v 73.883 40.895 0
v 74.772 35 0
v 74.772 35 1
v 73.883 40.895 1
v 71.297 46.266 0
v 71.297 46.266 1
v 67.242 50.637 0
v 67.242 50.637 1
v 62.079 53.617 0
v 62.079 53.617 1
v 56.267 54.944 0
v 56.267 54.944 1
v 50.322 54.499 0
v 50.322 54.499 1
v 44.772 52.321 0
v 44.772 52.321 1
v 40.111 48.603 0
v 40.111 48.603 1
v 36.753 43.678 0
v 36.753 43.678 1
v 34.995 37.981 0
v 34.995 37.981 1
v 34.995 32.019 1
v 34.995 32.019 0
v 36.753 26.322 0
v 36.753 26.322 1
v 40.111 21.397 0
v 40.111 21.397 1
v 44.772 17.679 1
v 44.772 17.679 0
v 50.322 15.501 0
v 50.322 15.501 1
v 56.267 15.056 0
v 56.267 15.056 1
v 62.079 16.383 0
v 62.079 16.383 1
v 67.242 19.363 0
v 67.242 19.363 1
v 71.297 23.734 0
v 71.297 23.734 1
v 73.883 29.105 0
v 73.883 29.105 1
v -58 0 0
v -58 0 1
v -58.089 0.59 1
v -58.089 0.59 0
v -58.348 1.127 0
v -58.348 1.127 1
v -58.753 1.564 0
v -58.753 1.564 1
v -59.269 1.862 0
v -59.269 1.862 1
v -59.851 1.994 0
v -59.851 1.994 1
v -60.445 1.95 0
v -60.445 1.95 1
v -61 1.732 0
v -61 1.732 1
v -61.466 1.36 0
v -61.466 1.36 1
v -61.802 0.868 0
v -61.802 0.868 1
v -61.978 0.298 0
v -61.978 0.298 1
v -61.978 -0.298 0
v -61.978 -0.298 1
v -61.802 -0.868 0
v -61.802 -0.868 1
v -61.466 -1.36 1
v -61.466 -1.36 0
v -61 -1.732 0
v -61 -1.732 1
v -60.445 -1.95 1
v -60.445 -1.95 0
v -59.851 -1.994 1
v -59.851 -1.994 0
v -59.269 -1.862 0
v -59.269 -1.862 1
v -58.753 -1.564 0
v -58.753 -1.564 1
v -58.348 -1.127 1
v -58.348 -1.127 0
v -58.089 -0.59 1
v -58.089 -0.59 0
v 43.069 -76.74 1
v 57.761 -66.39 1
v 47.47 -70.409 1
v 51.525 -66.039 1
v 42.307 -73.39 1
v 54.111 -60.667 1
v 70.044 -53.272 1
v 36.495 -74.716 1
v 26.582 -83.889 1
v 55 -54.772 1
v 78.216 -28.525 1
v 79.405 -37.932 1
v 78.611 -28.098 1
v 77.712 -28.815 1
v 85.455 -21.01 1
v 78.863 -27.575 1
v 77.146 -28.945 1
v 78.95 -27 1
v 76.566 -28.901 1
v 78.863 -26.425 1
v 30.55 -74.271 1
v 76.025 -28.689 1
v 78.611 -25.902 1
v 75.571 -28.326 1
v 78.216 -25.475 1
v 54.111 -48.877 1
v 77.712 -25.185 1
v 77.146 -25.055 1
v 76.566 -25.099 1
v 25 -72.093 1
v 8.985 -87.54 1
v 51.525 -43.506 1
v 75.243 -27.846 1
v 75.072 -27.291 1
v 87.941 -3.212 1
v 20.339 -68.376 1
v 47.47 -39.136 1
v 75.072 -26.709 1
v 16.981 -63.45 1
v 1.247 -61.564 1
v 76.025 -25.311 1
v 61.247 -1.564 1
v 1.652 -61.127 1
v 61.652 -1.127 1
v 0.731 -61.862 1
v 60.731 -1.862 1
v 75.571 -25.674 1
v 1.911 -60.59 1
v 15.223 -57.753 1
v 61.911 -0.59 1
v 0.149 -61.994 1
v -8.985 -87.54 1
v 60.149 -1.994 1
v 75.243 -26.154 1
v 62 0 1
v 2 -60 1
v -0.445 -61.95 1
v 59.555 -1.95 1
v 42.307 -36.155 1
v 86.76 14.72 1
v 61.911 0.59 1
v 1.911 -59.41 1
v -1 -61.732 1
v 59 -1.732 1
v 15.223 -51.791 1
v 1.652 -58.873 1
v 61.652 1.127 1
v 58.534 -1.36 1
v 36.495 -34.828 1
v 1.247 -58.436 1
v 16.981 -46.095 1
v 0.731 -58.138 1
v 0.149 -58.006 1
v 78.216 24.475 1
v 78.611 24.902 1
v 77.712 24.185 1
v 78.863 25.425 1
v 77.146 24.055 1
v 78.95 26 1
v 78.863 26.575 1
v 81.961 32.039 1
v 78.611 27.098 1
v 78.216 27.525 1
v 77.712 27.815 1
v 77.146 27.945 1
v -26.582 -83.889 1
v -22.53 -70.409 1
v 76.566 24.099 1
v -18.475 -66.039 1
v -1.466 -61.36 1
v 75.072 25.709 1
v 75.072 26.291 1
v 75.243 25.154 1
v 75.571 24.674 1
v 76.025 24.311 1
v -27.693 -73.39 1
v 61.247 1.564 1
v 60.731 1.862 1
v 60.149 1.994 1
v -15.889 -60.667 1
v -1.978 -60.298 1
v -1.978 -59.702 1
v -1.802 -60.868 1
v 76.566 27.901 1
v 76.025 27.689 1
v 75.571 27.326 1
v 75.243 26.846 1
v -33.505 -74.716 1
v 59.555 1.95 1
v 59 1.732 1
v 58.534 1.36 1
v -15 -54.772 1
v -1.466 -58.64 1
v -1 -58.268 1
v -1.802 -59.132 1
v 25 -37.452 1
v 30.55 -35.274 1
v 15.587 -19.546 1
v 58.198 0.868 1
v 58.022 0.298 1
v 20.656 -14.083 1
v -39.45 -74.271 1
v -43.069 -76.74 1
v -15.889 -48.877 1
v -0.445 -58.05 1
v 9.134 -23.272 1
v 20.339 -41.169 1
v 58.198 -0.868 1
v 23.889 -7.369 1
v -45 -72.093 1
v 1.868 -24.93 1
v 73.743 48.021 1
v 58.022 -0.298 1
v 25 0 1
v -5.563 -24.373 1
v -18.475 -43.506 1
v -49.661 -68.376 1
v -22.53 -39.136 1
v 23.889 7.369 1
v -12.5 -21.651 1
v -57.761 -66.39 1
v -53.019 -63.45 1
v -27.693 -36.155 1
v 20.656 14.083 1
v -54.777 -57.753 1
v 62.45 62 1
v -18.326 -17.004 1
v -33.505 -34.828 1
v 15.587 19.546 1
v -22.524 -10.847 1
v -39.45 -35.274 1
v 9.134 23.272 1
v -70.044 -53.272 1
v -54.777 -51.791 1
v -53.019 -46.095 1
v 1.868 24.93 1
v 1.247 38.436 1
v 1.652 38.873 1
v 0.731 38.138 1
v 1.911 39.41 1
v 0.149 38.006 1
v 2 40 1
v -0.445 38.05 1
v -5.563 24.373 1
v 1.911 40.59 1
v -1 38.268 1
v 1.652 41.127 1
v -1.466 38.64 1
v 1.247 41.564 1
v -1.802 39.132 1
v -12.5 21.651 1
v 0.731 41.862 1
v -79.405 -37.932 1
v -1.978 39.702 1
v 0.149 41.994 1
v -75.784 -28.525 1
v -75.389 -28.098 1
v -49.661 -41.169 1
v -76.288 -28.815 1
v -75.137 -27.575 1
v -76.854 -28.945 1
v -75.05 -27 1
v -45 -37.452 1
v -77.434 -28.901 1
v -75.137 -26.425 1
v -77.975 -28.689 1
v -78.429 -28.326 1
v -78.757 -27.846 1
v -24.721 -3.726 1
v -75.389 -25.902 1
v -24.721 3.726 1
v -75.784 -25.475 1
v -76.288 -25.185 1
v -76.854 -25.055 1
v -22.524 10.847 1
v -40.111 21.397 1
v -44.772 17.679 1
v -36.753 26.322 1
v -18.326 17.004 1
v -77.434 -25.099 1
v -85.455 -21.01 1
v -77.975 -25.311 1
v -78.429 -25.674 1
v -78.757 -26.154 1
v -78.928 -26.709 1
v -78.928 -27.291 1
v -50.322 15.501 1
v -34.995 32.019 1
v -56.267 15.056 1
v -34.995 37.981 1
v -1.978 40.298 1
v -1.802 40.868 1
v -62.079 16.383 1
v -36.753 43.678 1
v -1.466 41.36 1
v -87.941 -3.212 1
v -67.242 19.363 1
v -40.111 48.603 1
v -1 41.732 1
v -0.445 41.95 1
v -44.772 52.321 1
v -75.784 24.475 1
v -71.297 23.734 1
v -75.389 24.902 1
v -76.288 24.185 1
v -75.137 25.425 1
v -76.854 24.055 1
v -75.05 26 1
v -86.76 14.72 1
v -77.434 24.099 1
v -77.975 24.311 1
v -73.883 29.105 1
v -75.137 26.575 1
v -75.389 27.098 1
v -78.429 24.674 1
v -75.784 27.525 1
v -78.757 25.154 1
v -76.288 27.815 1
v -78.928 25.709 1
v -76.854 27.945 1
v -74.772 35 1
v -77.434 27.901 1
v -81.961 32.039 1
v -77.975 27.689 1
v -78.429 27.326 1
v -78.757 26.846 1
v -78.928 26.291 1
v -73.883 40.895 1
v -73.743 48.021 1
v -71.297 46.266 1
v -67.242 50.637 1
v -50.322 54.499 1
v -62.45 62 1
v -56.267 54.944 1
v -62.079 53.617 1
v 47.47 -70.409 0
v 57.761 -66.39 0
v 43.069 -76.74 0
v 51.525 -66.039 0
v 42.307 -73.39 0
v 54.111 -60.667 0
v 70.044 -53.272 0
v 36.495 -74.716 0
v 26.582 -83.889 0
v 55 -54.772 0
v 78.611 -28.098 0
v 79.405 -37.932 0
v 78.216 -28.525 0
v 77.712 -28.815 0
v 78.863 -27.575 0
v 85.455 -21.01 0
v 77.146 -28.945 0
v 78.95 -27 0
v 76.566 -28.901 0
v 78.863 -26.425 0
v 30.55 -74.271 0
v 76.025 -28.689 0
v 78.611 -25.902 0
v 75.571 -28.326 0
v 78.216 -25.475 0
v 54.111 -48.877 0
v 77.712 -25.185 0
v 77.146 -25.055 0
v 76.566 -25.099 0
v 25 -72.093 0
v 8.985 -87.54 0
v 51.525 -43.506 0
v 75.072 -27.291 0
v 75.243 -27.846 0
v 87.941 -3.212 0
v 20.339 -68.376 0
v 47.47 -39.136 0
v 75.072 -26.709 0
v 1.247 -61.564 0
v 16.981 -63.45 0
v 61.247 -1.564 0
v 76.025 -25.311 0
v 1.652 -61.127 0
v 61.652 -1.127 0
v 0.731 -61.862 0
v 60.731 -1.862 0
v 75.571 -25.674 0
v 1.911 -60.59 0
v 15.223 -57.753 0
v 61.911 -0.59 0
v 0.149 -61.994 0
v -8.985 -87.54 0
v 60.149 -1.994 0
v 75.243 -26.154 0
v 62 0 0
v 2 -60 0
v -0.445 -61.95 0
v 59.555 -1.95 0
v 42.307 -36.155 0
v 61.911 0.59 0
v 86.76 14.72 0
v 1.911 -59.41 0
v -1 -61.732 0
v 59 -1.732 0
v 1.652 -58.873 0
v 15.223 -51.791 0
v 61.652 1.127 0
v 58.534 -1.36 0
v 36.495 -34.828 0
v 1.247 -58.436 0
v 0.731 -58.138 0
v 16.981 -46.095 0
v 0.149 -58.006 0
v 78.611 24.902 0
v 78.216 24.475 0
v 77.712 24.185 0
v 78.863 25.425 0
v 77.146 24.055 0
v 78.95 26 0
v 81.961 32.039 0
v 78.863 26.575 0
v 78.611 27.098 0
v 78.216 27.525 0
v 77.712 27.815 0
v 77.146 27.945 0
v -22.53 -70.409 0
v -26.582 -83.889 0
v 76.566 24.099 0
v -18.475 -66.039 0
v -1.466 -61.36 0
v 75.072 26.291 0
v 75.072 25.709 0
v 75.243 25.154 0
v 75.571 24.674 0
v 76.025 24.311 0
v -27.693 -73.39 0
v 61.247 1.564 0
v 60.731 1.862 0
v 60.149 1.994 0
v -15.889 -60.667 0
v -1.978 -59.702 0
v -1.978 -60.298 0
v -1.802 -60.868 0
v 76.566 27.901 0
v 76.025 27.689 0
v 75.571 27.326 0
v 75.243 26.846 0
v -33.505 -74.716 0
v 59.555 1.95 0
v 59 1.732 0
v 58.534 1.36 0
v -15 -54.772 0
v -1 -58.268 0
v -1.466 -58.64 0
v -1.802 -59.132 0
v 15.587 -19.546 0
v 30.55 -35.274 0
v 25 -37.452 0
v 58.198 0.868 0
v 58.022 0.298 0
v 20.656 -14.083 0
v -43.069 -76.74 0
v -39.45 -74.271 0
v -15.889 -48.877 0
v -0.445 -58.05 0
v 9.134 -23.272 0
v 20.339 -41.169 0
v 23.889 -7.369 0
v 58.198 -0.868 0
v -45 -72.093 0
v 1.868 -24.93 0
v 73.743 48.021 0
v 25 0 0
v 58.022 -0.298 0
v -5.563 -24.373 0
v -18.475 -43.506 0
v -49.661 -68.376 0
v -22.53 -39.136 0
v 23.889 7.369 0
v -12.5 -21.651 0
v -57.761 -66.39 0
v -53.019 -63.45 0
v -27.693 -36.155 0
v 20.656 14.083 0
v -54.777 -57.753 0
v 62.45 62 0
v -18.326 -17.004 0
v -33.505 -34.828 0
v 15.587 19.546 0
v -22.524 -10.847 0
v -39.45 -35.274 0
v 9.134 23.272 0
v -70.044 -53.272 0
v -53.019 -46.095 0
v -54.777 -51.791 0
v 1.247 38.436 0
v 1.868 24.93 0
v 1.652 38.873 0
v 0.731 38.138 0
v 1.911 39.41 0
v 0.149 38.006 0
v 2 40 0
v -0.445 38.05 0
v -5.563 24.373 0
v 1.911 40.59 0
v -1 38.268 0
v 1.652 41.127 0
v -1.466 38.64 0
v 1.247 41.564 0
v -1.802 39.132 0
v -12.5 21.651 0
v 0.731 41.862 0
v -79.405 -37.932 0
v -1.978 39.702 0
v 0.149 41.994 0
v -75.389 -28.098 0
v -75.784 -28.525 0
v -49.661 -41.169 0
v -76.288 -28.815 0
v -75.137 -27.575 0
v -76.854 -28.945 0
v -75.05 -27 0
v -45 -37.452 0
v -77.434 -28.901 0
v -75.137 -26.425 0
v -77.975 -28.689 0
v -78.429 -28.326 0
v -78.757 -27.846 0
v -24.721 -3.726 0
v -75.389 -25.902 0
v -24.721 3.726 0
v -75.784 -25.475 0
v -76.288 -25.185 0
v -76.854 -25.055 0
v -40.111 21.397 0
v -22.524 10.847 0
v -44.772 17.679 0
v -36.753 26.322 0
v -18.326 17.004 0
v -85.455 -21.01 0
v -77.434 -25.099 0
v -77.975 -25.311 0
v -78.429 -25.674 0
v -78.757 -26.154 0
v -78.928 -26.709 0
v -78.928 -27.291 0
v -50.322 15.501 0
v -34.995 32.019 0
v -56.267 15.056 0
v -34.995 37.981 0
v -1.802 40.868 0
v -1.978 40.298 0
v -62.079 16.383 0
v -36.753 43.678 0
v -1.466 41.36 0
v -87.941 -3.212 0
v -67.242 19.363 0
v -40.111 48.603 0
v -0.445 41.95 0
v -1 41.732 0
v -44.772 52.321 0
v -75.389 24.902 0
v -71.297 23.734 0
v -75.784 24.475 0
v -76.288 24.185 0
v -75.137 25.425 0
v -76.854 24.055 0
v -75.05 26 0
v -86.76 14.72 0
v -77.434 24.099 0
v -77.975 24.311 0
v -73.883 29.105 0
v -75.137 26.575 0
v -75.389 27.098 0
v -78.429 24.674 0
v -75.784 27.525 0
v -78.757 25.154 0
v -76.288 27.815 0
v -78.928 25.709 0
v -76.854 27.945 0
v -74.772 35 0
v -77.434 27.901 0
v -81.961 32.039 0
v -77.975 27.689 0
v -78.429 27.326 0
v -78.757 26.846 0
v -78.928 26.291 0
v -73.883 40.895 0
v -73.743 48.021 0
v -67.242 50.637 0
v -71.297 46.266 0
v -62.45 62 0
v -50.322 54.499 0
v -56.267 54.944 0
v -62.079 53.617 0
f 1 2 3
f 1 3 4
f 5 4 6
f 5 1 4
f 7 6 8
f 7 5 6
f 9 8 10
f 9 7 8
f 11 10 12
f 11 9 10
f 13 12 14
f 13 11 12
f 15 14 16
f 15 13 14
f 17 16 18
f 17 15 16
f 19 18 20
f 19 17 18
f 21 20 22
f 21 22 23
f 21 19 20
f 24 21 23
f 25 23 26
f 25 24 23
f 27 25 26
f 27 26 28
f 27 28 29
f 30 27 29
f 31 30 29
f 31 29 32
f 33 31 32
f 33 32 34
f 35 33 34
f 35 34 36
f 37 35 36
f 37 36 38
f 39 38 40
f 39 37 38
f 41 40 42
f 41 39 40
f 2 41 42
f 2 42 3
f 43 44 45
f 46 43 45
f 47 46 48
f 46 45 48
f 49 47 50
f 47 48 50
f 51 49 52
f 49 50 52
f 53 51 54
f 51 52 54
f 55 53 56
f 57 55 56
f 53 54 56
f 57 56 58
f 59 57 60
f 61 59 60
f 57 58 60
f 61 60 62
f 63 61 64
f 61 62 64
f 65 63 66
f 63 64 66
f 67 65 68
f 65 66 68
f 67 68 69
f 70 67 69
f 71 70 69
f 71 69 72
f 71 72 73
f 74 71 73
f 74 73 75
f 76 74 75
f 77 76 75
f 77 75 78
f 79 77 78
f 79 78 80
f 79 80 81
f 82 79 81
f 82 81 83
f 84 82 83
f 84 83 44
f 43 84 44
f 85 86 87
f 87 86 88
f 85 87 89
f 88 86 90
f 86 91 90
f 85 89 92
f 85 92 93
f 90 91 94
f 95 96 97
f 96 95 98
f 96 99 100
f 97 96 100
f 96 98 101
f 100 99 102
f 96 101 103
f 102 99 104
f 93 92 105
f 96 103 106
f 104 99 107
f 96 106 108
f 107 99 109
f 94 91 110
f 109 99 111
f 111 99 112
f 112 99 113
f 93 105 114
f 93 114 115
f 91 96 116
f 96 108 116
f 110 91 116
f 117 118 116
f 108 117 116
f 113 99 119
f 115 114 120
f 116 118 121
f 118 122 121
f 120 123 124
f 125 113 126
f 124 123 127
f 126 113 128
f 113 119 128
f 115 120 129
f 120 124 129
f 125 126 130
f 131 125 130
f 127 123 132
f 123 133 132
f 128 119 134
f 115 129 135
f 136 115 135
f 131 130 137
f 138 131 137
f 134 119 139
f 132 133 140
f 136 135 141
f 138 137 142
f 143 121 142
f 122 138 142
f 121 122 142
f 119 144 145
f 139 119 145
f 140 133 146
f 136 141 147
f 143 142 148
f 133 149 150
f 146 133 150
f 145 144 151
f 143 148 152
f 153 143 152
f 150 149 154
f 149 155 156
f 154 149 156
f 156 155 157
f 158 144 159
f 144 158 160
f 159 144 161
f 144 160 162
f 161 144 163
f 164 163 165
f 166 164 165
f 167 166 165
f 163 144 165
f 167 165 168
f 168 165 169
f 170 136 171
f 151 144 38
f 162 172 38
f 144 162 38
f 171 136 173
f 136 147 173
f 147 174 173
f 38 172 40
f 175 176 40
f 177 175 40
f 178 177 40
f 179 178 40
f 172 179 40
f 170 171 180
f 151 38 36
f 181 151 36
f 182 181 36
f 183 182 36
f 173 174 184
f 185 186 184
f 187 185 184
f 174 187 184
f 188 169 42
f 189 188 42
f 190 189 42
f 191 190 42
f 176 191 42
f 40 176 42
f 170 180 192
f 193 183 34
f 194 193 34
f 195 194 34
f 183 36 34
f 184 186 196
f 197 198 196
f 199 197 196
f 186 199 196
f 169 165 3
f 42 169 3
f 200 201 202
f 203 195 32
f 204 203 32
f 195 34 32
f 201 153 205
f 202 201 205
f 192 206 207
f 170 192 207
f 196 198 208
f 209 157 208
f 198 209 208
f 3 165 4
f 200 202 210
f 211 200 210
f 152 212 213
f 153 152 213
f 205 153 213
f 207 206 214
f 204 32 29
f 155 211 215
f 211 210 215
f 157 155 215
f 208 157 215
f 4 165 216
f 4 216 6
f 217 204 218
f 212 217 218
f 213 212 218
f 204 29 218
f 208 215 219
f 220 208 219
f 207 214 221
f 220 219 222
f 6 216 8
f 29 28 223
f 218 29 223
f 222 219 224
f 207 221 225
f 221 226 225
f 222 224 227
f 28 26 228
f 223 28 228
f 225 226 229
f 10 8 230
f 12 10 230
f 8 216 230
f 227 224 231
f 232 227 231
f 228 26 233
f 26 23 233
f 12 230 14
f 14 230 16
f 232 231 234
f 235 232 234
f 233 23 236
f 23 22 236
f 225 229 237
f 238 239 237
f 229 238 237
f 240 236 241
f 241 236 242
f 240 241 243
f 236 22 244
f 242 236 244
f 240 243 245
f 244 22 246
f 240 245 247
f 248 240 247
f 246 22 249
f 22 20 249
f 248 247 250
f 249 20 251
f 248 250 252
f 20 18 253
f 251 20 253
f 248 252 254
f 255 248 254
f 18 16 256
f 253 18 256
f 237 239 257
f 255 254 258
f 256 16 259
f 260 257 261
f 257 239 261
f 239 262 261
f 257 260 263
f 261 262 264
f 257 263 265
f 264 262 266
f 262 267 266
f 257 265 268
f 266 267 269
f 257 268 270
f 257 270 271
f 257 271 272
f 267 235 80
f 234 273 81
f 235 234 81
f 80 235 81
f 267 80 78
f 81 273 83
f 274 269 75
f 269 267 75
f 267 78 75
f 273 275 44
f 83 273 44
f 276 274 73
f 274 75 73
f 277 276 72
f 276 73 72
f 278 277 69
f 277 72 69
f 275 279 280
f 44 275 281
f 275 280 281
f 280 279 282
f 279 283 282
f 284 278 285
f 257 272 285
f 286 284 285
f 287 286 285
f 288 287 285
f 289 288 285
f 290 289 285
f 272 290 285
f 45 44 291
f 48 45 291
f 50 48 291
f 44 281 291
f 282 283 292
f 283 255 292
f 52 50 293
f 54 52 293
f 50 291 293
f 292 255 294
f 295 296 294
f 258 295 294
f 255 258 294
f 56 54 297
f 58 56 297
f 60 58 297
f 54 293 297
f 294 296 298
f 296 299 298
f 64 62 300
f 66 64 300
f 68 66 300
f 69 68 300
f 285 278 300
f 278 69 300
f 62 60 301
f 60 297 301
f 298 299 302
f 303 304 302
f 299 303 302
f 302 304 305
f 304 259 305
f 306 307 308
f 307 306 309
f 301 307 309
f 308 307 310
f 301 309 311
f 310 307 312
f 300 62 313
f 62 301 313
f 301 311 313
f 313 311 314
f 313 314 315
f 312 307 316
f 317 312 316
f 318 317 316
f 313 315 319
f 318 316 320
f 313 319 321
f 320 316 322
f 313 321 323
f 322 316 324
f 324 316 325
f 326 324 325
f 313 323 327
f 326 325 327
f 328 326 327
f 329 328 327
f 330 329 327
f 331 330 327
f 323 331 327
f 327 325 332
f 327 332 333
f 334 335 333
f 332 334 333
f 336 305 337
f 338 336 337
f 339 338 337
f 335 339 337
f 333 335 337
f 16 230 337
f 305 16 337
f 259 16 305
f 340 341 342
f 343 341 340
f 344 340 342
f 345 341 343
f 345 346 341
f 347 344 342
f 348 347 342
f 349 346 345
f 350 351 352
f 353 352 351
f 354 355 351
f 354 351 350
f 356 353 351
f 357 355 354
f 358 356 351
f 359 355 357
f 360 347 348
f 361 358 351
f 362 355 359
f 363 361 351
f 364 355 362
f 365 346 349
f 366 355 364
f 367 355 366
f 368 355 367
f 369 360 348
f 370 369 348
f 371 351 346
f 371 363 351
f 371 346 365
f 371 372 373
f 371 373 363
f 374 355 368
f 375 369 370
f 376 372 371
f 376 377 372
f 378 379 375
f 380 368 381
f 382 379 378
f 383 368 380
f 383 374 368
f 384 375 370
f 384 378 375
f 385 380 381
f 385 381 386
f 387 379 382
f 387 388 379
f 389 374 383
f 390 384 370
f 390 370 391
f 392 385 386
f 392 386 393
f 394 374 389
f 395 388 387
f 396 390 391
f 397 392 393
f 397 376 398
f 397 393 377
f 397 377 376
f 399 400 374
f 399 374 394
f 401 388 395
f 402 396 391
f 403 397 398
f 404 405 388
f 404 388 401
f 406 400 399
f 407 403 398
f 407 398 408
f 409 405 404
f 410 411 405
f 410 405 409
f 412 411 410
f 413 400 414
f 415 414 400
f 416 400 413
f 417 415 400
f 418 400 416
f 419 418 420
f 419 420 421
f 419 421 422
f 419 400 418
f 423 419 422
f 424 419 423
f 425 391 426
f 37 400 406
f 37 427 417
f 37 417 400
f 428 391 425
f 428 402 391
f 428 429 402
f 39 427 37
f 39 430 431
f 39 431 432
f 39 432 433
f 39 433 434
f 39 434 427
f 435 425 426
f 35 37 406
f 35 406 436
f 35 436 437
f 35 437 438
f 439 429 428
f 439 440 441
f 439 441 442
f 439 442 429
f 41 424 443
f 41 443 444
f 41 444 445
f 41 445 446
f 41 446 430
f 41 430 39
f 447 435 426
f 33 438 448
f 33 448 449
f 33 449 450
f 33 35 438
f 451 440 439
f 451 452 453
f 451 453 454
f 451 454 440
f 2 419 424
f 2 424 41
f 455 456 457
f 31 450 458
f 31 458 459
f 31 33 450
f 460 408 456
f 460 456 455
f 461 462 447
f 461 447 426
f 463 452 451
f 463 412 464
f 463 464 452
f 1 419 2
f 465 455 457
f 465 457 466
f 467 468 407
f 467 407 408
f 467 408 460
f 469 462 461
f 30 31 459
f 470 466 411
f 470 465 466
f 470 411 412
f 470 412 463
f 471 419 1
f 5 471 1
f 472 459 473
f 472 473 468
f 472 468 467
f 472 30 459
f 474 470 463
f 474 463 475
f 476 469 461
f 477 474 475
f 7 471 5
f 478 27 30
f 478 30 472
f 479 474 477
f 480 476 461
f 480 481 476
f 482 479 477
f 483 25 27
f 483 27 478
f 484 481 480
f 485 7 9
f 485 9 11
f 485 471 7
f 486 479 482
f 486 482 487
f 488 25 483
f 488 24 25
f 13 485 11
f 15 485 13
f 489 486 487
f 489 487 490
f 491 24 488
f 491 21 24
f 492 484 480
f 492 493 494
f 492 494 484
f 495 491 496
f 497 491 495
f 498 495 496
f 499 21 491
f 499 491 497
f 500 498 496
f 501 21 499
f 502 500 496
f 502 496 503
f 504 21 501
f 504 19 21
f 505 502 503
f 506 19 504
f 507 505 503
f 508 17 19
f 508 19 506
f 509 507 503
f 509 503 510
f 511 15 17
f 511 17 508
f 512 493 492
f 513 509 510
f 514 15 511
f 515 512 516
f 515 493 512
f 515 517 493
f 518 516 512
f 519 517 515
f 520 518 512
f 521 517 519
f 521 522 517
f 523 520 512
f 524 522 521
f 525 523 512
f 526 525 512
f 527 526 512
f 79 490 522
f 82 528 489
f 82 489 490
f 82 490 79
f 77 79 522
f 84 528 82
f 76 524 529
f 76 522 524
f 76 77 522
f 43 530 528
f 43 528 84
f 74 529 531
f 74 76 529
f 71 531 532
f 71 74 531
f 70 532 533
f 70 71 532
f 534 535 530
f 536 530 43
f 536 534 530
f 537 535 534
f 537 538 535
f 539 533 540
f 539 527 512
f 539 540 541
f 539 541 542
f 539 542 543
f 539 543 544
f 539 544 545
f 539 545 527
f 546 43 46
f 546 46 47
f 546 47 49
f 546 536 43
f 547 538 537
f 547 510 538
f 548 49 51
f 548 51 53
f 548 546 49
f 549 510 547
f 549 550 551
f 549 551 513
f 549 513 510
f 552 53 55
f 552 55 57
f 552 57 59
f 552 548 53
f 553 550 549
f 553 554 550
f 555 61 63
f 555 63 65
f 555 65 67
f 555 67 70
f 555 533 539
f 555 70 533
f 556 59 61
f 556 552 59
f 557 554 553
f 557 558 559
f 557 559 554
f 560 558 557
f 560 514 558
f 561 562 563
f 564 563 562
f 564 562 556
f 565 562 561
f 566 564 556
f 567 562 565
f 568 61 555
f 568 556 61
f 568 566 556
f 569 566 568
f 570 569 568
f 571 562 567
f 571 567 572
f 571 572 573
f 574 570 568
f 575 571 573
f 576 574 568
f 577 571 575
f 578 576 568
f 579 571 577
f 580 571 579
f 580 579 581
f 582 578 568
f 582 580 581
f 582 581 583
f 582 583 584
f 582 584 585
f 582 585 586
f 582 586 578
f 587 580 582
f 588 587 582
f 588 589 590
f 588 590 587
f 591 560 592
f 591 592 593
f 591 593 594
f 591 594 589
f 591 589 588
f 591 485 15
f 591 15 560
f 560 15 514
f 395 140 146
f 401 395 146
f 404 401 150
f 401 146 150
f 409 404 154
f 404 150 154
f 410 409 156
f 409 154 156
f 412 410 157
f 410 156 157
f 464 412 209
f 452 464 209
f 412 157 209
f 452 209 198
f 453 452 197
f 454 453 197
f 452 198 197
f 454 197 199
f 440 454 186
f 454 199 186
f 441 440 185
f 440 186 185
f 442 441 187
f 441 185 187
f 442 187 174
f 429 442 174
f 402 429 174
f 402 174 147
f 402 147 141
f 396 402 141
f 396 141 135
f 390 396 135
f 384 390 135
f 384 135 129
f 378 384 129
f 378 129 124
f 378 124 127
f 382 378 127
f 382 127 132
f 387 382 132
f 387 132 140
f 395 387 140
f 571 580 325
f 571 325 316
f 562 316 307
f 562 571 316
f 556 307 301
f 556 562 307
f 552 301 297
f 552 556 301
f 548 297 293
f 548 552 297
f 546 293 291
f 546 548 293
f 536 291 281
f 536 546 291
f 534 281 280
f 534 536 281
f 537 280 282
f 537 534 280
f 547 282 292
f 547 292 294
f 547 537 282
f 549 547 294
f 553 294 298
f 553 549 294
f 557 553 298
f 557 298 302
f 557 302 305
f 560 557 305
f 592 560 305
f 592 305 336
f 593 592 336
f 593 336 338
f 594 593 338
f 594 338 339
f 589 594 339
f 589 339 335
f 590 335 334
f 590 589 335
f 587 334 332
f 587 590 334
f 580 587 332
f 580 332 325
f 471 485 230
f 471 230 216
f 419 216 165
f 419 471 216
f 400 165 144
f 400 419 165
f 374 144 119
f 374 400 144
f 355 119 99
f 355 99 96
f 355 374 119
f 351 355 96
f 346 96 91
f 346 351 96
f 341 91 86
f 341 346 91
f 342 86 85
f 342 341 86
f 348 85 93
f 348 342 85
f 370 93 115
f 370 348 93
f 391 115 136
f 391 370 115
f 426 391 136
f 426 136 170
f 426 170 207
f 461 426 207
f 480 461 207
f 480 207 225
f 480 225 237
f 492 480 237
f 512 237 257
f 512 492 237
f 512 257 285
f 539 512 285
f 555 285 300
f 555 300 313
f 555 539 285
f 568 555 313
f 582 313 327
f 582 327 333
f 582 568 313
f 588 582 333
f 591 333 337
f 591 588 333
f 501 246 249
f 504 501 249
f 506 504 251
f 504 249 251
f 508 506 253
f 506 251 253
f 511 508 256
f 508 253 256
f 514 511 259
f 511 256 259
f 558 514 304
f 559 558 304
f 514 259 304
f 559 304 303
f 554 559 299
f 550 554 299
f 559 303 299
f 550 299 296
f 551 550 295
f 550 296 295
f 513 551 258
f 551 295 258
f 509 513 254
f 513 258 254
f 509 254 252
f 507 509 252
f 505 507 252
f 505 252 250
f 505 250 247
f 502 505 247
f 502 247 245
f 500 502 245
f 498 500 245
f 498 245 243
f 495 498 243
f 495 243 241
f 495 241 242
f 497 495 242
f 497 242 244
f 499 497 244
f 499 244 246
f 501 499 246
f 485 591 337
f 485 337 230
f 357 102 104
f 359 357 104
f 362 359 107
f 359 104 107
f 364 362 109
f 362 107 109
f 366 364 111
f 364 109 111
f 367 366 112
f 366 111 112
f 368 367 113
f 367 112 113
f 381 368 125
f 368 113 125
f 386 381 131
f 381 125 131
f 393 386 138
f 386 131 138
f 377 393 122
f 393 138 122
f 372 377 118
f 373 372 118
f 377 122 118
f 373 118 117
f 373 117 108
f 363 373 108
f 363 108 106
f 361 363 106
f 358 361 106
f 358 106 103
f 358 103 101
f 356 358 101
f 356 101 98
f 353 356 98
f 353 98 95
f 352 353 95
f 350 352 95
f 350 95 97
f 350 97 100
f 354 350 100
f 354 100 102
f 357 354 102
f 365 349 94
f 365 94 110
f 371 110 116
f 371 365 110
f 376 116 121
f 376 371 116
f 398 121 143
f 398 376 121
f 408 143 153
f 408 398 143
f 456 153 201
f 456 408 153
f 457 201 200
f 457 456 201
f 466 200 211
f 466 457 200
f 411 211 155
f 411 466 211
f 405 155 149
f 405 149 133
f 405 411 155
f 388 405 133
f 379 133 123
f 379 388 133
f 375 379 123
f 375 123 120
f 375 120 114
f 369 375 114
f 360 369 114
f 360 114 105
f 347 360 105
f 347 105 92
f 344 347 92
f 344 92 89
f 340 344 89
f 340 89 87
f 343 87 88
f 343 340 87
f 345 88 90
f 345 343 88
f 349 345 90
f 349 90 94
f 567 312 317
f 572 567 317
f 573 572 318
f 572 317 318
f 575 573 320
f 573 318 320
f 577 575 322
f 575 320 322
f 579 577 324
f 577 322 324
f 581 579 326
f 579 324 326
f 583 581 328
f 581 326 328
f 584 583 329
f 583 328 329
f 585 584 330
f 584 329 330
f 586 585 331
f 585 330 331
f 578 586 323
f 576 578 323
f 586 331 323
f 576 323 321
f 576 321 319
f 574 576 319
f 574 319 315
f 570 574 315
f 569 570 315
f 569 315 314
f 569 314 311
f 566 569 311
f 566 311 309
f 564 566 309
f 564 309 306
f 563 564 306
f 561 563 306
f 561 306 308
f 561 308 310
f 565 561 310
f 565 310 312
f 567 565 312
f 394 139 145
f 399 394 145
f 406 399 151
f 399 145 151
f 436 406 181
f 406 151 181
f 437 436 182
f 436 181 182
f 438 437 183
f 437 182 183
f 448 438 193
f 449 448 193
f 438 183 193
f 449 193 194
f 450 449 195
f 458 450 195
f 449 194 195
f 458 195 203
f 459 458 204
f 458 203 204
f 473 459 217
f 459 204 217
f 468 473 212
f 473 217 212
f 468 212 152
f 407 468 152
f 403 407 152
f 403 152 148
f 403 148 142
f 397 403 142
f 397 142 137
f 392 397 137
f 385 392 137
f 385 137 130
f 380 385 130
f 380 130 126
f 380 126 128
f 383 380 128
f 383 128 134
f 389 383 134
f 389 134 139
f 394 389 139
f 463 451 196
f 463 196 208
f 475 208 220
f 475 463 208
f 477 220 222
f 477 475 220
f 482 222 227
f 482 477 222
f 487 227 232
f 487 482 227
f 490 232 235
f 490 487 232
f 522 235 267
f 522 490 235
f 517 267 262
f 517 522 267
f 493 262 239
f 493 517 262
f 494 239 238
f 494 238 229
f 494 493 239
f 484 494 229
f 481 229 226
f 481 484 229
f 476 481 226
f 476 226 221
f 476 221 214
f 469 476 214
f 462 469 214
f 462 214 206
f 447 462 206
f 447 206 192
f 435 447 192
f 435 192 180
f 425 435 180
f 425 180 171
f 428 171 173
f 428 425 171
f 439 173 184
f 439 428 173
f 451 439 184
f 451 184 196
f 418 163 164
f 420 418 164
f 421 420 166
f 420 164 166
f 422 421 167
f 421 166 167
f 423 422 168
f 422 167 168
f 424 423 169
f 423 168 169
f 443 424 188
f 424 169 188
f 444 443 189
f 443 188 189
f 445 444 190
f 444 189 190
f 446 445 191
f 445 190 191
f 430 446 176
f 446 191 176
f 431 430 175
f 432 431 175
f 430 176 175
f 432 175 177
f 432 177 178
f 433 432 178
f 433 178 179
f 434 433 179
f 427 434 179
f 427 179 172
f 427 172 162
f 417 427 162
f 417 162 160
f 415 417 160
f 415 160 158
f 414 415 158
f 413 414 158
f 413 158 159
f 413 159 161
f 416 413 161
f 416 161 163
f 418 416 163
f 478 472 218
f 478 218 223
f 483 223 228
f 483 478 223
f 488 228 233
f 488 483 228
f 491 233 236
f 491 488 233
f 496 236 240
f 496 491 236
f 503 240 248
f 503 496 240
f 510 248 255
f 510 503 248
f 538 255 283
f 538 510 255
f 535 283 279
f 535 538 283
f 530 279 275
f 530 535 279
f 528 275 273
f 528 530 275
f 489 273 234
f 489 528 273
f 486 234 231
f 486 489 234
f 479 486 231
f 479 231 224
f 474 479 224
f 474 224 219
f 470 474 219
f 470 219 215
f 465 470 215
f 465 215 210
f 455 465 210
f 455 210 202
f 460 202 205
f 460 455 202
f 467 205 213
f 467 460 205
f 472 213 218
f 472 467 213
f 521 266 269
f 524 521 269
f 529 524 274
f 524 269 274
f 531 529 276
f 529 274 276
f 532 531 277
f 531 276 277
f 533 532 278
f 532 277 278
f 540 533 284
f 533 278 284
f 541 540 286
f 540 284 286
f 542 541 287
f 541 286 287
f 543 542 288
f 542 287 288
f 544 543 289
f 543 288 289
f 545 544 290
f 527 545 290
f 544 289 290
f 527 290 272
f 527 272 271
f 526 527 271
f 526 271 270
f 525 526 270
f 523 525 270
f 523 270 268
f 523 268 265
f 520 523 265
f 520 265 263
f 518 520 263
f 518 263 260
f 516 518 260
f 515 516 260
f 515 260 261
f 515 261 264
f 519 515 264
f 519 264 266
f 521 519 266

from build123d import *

# Parameters (mm, degrees)
SKETCH_1_R              = 25
SKETCH_1_R_2            = 20
EXTRUDE_1_DEPTH         = 1
HOLE_WIZARD_3_9_3_9_1_D = 3.9
SKETCH_4_R              = 2
CUT_EXTRUDE_1_DEPTH     = 10


with BuildPart() as part:
    # 草图1 → 凸台-拉伸1 (new body)
    with BuildSketch(Plane.XY):
        with BuildLine():
            Line((-62.449979984, 62), (62.449979984, 62))
            ThreePointArc((62.449979984, 62), (0, -88), (-62.449979984, 62))
        make_face()
        Circle(SKETCH_1_R, mode=Mode.SUBTRACT)
        with Locations((54.772, 35)):
            Circle(SKETCH_1_R_2, mode=Mode.SUBTRACT)
        with Locations(Location((-54.772, 35, 0), (0, 0, 180))):
            Circle(SKETCH_1_R_2, mode=Mode.SUBTRACT)
        with Locations((35, -54.772255751)):
            Circle(SKETCH_1_R_2, mode=Mode.SUBTRACT)
        with Locations((-35, -54.772255751)):
            Circle(SKETCH_1_R_2, mode=Mode.SUBTRACT)
    extrude(amount=EXTRUDE_1_DEPTH)

    # Ø3.9 (3.9) 直径孔1 (through all)
    with Locations(Plane(origin=(0, 0, 0), x_dir=(-1, 0, 0), z_dir=(0, 0, -1))):
        with Locations((-77, 26), (-77, -27), (77, -27), (77, 26)):
            Hole(HOLE_WIZARD_3_9_3_9_1_D / 2)

    # 草图4 → 切除-拉伸1 (cut)
    with BuildSketch(Plane.XY.offset(1)):
        with Locations((-60, 0)):
            Circle(SKETCH_4_R)
        with Locations((0, 40)):
            Circle(SKETCH_4_R)
        with Locations((60, 0)):
            Circle(SKETCH_4_R)
        with Locations((0, -60)):
            Circle(SKETCH_4_R)
    extrude(amount=-CUT_EXTRUDE_1_DEPTH, mode=Mode.SUBTRACT)


solid = part.part
